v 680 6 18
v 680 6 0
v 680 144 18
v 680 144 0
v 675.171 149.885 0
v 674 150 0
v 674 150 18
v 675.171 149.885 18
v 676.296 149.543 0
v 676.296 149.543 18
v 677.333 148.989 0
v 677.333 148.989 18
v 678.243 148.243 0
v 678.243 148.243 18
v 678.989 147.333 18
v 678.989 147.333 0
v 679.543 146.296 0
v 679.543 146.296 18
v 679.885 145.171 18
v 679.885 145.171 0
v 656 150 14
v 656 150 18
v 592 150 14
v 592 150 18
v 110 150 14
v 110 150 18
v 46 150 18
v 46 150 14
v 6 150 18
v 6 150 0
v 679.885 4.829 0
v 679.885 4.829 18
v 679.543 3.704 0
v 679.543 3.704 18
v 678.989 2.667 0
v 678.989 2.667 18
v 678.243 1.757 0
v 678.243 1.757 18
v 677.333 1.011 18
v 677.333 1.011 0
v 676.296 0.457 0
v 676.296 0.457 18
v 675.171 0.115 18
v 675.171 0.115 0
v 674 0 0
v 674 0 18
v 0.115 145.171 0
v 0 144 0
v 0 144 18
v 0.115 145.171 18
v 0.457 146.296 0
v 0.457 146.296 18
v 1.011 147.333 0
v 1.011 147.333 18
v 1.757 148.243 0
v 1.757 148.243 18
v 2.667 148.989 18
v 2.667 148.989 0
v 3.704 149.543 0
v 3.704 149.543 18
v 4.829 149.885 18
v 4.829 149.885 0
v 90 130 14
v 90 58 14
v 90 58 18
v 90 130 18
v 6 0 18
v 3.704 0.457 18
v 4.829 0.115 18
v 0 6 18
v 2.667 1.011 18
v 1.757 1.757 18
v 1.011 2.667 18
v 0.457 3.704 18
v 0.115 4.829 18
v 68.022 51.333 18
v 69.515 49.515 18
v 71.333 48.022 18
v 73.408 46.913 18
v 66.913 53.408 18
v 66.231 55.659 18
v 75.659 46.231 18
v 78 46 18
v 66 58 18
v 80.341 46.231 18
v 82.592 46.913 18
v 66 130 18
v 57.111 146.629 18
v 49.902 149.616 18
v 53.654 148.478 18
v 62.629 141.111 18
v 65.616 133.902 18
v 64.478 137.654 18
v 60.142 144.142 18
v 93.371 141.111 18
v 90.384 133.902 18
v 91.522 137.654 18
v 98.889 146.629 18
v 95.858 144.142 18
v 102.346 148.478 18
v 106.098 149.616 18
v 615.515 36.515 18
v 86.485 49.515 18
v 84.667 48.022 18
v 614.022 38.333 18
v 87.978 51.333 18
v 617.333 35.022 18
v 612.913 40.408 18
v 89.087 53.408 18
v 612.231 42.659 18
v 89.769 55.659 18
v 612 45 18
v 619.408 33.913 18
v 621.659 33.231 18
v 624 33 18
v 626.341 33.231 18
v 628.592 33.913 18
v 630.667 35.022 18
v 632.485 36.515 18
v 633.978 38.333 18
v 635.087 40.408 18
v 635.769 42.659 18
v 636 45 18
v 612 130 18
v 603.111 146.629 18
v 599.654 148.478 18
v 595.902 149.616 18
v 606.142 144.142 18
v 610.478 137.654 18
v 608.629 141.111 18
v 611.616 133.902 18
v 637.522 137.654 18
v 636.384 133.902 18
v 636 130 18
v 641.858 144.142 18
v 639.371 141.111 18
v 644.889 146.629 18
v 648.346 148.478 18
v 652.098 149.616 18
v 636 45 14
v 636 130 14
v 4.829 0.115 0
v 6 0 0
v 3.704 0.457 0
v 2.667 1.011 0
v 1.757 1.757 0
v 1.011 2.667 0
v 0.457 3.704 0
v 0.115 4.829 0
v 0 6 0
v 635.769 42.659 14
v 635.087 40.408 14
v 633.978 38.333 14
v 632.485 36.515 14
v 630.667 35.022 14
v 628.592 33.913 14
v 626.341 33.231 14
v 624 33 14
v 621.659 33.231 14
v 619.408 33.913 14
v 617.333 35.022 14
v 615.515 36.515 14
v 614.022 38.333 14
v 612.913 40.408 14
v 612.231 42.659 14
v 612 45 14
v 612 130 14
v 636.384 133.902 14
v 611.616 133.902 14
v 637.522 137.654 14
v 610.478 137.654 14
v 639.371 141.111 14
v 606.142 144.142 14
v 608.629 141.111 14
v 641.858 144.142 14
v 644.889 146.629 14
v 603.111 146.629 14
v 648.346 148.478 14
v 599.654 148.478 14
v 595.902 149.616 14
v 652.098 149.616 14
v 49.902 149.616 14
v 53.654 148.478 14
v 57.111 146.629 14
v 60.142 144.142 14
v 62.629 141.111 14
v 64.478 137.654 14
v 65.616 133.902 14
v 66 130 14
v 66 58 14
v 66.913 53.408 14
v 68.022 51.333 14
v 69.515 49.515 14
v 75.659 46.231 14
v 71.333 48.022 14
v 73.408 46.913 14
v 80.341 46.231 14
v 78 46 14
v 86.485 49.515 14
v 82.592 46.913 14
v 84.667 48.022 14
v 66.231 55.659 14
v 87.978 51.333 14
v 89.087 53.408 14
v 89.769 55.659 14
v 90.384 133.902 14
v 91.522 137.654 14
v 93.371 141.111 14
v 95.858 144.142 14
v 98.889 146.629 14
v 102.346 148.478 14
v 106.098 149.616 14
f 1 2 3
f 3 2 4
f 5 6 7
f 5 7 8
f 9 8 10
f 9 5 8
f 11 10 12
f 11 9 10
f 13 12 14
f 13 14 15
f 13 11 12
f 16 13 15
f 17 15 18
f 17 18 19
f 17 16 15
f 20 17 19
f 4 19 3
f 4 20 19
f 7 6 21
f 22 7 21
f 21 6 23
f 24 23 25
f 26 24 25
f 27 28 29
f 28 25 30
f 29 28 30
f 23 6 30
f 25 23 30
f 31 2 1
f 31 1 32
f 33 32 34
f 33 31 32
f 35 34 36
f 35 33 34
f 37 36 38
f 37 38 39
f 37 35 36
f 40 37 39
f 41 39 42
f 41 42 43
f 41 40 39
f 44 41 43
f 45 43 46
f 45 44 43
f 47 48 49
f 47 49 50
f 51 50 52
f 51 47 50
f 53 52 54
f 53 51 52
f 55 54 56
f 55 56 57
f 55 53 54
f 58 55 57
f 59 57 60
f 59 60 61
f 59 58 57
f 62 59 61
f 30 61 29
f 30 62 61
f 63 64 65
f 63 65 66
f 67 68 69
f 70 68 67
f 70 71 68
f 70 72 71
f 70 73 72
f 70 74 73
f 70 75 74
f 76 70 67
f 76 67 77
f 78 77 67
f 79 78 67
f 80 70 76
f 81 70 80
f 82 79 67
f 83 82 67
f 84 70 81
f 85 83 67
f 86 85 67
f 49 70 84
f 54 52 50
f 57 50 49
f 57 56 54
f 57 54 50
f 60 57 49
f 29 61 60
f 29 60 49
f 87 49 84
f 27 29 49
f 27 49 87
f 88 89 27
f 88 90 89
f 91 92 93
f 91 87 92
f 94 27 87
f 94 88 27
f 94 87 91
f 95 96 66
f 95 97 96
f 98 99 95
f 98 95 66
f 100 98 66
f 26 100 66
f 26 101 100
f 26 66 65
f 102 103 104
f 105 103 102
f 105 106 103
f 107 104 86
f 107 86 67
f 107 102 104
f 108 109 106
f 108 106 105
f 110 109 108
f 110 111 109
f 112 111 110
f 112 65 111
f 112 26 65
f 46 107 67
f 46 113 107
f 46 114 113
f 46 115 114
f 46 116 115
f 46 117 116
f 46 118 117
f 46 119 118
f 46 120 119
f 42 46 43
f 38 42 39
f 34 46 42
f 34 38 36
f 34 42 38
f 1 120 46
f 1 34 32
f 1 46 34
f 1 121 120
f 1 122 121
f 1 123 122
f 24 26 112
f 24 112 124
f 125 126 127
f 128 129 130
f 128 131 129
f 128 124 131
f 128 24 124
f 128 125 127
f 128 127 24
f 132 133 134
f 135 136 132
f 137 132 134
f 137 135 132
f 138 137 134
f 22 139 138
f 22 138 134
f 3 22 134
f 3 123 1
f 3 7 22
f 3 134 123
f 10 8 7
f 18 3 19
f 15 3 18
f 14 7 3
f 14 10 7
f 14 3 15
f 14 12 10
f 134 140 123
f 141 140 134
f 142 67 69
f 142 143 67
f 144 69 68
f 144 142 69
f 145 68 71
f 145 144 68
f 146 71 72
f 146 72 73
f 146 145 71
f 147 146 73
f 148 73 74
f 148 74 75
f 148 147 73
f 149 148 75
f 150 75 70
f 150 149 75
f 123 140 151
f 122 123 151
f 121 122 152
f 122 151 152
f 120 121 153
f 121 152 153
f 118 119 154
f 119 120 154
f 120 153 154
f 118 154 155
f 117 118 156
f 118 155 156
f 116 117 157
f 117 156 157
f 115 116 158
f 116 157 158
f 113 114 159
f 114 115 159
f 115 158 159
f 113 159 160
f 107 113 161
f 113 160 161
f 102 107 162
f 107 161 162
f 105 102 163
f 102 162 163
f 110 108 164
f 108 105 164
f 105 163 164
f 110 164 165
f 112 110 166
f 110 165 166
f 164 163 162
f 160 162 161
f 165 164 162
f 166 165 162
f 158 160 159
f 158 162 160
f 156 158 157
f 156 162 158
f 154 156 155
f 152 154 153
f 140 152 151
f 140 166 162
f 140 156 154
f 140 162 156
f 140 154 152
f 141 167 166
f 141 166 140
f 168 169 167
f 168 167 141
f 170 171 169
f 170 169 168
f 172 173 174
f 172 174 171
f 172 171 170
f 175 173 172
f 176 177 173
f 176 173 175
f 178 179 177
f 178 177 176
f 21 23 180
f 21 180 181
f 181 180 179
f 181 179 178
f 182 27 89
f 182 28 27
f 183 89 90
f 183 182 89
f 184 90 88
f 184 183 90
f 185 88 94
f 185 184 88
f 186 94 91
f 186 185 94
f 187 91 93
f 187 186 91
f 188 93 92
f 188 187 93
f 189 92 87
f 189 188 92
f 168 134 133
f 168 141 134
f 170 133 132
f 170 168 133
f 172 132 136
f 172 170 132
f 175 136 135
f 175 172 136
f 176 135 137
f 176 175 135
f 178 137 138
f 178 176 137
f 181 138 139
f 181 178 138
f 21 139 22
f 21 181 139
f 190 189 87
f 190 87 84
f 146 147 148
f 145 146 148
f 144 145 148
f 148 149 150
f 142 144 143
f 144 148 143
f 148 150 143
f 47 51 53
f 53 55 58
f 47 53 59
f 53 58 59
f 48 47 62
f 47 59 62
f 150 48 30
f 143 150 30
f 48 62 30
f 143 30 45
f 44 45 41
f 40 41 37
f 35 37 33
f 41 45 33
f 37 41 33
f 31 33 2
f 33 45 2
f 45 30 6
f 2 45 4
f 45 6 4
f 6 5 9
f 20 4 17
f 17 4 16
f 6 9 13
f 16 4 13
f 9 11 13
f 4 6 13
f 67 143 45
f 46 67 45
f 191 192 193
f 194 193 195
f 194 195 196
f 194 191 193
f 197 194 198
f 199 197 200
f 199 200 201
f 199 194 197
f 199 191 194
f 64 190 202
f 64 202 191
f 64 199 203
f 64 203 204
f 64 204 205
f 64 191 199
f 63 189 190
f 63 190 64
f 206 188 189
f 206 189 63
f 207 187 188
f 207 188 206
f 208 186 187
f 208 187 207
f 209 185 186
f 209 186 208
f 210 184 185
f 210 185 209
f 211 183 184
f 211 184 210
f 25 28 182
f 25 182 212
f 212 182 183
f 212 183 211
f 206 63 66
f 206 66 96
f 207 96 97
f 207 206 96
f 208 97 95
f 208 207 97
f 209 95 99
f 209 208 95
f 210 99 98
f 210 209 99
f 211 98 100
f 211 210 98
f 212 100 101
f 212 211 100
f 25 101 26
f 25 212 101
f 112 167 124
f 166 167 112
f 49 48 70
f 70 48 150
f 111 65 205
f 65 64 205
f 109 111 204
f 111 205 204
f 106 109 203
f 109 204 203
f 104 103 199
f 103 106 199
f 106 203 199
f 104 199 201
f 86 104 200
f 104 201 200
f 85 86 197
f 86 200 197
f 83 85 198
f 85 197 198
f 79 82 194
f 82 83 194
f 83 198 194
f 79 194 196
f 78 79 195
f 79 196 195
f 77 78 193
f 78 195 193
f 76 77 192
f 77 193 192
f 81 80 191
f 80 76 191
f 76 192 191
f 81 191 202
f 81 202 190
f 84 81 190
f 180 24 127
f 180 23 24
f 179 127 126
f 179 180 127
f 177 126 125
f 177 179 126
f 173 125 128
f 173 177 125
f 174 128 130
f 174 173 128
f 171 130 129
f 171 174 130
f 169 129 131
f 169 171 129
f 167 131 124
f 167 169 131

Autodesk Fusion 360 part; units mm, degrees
sketch "Sketch1" plane through (0, 0, 0) normal (0, 0, 1) x (1, 0, 0)
  line L0 (6, 0) -> (674, 0)
  line L1 (680, 6) -> (680, 144)
  line L2 (674, 150) -> (6, 150)
  line L3 (0, 144) -> (0, 6)
  arc A0 (6, 150) -> (0, 144) centre (6, 144) ccw
  arc A1 (680, 144) -> (674, 150) centre (674, 144) ccw
  arc A2 (674, 0) -> (680, 6) centre (674, 6) ccw
  arc A3 (0, 6) -> (6, 0) centre (6, 6) ccw
  point P0 (680, 0)
  point P1 (0, 150)
  dimension "d44" = 680
  dimension "d45" = 150
  dimension "d46" = 6
extrude "Extrude4" add sketch "Sketch1" along normal blind 14
sketch "pf" plane through (0, 0, 14) normal (0, 0, 1) x (1, 0, 0)
  arc A0 (66, 58) -> (90, 58) centre (78, 58) ccw
  arc A1 (0, 144) -> (6, 150) centre (6, 144) cw
  arc A2 (680, 6) -> (674, 0) centre (674, 6) cw
  line L0 (636, 45) -> (636, 130)
  line L1 (6, 150) -> (46, 150)
  line L2 (656, 150) -> (674, 150)
  line L3 (0, 6) -> (0, 144)
  arc A3 (612, 45) -> (636, 45) centre (624, 45) ccw
  arc A4 (636, 130) -> (656, 150) centre (656, 130) cw
  line L4 (680, 144) -> (680, 6)
  arc A5 (90, 130) -> (110, 150) centre (110, 130) cw
  line L5 (612, 130) -> (612, 45)
  line L6 (110, 150) -> (592, 150)
  arc A6 (592, 150) -> (612, 130) centre (592, 130) cw
  arc A7 (46, 150) -> (66, 130) centre (46, 130) cw
  arc A8 (6, 0) -> (0, 6) centre (6, 6) cw
  arc A9 (674, 150) -> (680, 144) centre (674, 144) cw
  line L7 (674, 0) -> (6, 0)
  line L8 (66, 130) -> (66, 58)
  line L9 (90, 58) -> (90, 130)
extrude "Extrude5" add sketch "pf" along normal blind 4
